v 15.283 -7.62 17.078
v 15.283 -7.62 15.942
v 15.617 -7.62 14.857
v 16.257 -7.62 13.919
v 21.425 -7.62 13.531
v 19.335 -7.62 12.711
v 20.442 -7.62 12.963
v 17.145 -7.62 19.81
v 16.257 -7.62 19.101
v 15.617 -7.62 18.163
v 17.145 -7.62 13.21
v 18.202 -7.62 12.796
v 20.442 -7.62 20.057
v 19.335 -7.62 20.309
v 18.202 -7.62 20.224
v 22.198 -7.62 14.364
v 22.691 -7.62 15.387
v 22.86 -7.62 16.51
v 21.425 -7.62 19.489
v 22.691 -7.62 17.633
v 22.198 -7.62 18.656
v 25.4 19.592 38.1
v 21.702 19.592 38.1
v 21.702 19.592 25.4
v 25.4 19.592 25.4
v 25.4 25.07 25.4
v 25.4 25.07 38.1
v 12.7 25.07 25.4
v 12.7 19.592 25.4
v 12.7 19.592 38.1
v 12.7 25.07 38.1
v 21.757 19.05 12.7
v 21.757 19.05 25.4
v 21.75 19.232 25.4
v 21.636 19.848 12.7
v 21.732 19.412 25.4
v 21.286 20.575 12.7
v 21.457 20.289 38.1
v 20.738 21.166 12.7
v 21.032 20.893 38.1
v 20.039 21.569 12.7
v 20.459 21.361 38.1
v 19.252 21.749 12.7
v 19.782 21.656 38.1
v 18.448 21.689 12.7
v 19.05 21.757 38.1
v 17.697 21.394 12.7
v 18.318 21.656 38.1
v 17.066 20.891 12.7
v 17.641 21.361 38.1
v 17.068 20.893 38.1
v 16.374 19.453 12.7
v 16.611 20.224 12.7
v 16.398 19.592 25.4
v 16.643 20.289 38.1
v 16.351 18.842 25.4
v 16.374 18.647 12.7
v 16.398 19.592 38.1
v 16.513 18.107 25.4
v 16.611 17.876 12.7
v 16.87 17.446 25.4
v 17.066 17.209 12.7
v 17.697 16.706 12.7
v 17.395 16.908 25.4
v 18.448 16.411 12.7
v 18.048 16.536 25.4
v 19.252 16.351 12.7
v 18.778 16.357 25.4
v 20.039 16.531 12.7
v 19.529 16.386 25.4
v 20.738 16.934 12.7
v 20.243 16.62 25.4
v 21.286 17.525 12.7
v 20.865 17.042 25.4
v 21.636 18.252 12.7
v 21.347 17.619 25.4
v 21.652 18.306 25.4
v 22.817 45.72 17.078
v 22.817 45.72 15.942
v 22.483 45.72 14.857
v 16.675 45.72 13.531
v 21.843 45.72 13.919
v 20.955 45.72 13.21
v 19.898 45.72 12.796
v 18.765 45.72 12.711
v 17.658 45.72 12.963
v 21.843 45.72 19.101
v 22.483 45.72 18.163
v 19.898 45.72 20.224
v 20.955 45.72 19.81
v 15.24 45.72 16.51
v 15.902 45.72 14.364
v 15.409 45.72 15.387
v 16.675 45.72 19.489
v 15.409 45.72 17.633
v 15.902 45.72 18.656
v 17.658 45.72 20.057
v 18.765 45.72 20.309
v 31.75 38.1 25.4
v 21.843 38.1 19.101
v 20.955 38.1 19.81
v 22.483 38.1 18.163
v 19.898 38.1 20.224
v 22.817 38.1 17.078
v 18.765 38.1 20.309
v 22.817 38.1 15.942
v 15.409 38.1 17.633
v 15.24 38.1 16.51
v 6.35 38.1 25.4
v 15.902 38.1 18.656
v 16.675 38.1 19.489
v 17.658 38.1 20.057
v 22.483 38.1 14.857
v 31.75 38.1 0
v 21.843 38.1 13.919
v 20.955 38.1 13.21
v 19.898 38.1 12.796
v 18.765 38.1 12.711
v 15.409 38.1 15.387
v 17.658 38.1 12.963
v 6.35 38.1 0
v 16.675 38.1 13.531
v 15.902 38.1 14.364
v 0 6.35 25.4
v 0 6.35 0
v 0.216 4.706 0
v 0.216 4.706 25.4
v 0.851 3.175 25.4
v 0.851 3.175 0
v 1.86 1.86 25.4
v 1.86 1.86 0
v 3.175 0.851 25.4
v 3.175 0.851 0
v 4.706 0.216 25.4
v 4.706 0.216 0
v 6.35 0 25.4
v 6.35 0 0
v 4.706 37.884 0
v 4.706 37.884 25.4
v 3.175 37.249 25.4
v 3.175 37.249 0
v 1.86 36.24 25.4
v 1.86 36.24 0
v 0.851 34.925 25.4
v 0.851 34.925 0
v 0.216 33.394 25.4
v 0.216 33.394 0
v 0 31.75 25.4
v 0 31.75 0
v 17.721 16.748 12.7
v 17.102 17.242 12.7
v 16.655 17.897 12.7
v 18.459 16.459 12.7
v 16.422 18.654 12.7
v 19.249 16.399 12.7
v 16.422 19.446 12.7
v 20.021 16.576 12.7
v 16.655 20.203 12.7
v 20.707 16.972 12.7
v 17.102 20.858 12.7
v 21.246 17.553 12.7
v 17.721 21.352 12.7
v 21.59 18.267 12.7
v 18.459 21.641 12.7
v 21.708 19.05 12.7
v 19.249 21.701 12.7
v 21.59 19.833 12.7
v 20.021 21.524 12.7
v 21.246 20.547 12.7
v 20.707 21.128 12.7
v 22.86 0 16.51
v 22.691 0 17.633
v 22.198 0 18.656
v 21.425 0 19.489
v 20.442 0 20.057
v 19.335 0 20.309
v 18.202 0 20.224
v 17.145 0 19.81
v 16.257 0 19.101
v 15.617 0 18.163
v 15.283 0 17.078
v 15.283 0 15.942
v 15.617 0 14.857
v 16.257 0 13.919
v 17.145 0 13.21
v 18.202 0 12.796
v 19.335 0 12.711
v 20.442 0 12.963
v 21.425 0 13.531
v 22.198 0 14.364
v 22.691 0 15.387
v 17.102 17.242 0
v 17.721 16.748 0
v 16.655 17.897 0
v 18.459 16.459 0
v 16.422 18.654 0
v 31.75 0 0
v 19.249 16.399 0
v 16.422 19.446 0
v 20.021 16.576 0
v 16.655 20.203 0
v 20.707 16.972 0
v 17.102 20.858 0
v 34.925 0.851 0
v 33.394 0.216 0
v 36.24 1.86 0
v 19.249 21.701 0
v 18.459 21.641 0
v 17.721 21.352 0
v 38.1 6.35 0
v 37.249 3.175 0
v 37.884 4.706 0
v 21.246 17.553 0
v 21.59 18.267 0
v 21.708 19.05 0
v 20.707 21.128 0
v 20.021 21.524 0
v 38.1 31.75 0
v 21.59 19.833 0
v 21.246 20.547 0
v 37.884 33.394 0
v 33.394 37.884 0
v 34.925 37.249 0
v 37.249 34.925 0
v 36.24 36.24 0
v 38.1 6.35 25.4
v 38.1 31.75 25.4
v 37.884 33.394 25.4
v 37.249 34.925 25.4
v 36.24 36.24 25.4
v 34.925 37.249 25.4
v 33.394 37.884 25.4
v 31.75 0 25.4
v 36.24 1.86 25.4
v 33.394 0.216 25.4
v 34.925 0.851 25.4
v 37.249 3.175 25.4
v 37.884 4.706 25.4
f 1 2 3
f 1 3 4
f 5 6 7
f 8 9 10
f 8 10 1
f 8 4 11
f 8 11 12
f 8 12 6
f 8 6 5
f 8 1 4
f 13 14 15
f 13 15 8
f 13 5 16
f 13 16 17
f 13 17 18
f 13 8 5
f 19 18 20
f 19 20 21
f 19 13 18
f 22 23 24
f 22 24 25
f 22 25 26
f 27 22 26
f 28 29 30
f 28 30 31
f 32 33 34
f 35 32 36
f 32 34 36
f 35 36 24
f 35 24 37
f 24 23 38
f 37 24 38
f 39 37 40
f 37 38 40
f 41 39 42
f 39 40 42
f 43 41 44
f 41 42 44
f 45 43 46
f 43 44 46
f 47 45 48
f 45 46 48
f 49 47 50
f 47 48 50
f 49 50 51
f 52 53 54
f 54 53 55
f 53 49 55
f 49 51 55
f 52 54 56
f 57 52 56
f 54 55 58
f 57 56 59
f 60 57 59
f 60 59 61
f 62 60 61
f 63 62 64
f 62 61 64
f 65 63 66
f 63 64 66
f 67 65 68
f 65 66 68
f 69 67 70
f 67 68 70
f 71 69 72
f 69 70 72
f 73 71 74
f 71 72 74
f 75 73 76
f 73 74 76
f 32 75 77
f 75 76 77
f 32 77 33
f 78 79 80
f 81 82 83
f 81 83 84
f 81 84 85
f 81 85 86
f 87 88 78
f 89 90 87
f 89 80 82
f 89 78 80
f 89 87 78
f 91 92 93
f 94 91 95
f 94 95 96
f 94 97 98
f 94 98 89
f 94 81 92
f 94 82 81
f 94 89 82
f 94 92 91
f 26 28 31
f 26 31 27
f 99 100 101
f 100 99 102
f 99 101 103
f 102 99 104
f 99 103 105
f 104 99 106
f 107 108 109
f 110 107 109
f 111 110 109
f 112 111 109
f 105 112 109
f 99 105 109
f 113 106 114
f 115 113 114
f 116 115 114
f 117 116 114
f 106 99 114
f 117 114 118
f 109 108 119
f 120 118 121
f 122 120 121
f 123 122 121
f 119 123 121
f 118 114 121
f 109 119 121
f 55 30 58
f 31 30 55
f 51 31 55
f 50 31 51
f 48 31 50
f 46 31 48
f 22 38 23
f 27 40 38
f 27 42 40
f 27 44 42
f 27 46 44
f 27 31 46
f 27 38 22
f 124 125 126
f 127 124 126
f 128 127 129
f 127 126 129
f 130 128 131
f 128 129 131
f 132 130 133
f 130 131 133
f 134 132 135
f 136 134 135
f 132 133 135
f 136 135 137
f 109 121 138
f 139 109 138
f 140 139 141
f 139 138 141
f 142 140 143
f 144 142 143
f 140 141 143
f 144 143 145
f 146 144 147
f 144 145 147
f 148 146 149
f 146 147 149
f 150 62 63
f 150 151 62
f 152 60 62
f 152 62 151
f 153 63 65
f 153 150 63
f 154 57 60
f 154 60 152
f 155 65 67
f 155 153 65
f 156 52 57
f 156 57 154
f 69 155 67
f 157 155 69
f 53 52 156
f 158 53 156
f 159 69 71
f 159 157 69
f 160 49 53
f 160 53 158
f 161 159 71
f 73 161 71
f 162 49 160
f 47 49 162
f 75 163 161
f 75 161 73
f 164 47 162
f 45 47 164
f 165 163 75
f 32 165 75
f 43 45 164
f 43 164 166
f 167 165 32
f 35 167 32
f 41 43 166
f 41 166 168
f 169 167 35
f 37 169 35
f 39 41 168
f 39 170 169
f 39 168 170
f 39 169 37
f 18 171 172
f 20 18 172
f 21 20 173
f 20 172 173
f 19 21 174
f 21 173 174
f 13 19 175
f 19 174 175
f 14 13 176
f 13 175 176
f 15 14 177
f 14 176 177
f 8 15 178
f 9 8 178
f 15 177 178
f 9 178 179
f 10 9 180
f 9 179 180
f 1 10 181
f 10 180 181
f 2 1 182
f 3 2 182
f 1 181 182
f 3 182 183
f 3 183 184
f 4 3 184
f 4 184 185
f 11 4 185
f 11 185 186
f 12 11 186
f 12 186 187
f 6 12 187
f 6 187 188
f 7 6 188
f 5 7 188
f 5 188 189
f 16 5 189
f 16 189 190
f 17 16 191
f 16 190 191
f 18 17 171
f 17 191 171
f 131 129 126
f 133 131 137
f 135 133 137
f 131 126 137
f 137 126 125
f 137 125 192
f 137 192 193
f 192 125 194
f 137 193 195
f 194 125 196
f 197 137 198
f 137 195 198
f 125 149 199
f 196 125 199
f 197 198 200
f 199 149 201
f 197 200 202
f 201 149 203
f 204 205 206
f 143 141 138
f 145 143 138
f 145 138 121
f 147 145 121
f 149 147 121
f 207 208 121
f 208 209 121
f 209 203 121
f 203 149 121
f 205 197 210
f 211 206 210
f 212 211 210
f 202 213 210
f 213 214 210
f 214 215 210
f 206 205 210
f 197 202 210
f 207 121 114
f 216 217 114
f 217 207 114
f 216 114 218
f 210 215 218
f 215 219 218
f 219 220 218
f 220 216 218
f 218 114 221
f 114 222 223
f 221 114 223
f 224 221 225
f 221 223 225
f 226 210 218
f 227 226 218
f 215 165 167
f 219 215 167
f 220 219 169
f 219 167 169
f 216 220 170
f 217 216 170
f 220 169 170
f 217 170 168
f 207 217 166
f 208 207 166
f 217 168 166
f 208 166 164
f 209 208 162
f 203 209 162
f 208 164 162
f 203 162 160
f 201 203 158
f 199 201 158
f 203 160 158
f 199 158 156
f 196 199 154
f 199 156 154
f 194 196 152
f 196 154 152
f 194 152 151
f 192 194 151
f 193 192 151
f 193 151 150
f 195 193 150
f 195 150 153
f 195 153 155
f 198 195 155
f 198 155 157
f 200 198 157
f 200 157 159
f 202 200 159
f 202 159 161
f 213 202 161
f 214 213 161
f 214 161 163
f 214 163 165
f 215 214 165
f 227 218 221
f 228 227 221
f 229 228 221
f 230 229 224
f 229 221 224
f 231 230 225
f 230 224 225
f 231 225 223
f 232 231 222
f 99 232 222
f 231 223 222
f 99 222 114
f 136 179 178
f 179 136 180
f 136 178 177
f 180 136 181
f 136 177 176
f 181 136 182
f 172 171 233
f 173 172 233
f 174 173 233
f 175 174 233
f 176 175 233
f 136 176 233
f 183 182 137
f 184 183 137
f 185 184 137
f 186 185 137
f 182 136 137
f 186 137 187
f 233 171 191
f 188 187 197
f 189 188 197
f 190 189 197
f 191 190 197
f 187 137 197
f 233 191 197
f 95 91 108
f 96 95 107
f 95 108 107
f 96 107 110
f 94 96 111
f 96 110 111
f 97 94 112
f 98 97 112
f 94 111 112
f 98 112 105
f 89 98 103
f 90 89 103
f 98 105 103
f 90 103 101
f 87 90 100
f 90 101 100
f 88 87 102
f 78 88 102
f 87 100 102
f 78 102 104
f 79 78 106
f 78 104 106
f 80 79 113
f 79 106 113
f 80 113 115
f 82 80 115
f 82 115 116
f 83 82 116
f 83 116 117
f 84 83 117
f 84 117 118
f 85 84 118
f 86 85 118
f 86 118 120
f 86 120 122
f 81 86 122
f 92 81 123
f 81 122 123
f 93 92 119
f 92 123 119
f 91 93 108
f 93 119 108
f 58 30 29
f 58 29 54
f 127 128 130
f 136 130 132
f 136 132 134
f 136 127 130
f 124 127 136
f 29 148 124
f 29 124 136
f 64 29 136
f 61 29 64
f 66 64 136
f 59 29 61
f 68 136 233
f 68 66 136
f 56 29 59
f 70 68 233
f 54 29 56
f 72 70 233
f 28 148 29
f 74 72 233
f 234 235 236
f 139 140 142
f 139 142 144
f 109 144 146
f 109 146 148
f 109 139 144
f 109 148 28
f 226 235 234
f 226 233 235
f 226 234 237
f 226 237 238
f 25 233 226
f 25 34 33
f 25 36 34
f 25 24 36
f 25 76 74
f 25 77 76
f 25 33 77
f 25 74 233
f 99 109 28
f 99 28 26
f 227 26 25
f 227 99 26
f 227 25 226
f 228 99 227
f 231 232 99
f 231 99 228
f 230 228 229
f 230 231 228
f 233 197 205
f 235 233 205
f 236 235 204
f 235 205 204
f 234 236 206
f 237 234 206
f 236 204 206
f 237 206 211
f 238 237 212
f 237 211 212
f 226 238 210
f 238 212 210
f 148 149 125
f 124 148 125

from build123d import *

# Parameters (mm, degrees)
F1_DEPTH  = 25.4
F4_W      = 12.7
F4_H      = 5.478115
F5_DEPTH  = 12.7
F3_R      = 2.658023
F6_DEPTH  = 25.4
F7_R      = 2.706584
F8_DEPTH  = 25.4
F9_R      = 3.81
F11_DEPTH = 7.62
F10_R     = 3.81
F12_DEPTH = 7.62


with BuildPart() as f1:
    # F0 (on Top) → F1 (new body)
    with BuildSketch(Plane.XY):
        with BuildLine():
            ThreePointArc((0, 6.35), (1.859872, 1.859872), (6.35, 0))
            Line((6.35, 0), (31.75, 0))
            ThreePointArc((31.75, 0), (36.240128, 1.859872), (38.1, 6.35))
            Line((38.1, 6.35), (38.1, 31.75))
            ThreePointArc((38.1, 31.75), (36.240128, 36.240128), (31.75, 38.1))
            Line((31.75, 38.1), (6.35, 38.1))
            ThreePointArc((6.35, 38.1), (1.859872, 36.240128), (0, 31.75))
            Line((0, 31.75), (0, 6.35))
        make_face()
    extrude(amount=F1_DEPTH)

    # F4 (on face) → F5 (join)
    with BuildSketch(Plane.XY.offset(25.4)):
        with Locations((19.05, 22.330752)):
            Rectangle(F4_W, F4_H)
    extrude(amount=F5_DEPTH)

    # F3 (on face) → F6 (cut)
    with BuildSketch(Plane.XY.offset(25.4)):
        with Locations((19.05, 19.05)):
            Circle(F3_R)
    extrude(amount=-F6_DEPTH, mode=Mode.SUBTRACT)

    # F7 (on face) → F8 (cut)
    with BuildSketch(Plane.XY.offset(38.1)):
        with Locations((19.05, 19.05)):
            Circle(F7_R)
    extrude(amount=-F8_DEPTH, mode=Mode.SUBTRACT)

    # F9 (on face) → F11 (join)
    with BuildSketch(Plane.XZ):
        with Locations((19.05, 16.51)):
            Circle(F9_R)
    extrude(amount=F11_DEPTH)

    # F10 (on face) → F12 (join)
    with BuildSketch(Plane(origin=(0, 38.1, 0), x_dir=(-1, 0, 0), z_dir=(0, 1, 0))):
        with Locations((-19.05, 16.51)):
            Circle(F10_R)
    extrude(amount=F12_DEPTH)


solid = f1.part
